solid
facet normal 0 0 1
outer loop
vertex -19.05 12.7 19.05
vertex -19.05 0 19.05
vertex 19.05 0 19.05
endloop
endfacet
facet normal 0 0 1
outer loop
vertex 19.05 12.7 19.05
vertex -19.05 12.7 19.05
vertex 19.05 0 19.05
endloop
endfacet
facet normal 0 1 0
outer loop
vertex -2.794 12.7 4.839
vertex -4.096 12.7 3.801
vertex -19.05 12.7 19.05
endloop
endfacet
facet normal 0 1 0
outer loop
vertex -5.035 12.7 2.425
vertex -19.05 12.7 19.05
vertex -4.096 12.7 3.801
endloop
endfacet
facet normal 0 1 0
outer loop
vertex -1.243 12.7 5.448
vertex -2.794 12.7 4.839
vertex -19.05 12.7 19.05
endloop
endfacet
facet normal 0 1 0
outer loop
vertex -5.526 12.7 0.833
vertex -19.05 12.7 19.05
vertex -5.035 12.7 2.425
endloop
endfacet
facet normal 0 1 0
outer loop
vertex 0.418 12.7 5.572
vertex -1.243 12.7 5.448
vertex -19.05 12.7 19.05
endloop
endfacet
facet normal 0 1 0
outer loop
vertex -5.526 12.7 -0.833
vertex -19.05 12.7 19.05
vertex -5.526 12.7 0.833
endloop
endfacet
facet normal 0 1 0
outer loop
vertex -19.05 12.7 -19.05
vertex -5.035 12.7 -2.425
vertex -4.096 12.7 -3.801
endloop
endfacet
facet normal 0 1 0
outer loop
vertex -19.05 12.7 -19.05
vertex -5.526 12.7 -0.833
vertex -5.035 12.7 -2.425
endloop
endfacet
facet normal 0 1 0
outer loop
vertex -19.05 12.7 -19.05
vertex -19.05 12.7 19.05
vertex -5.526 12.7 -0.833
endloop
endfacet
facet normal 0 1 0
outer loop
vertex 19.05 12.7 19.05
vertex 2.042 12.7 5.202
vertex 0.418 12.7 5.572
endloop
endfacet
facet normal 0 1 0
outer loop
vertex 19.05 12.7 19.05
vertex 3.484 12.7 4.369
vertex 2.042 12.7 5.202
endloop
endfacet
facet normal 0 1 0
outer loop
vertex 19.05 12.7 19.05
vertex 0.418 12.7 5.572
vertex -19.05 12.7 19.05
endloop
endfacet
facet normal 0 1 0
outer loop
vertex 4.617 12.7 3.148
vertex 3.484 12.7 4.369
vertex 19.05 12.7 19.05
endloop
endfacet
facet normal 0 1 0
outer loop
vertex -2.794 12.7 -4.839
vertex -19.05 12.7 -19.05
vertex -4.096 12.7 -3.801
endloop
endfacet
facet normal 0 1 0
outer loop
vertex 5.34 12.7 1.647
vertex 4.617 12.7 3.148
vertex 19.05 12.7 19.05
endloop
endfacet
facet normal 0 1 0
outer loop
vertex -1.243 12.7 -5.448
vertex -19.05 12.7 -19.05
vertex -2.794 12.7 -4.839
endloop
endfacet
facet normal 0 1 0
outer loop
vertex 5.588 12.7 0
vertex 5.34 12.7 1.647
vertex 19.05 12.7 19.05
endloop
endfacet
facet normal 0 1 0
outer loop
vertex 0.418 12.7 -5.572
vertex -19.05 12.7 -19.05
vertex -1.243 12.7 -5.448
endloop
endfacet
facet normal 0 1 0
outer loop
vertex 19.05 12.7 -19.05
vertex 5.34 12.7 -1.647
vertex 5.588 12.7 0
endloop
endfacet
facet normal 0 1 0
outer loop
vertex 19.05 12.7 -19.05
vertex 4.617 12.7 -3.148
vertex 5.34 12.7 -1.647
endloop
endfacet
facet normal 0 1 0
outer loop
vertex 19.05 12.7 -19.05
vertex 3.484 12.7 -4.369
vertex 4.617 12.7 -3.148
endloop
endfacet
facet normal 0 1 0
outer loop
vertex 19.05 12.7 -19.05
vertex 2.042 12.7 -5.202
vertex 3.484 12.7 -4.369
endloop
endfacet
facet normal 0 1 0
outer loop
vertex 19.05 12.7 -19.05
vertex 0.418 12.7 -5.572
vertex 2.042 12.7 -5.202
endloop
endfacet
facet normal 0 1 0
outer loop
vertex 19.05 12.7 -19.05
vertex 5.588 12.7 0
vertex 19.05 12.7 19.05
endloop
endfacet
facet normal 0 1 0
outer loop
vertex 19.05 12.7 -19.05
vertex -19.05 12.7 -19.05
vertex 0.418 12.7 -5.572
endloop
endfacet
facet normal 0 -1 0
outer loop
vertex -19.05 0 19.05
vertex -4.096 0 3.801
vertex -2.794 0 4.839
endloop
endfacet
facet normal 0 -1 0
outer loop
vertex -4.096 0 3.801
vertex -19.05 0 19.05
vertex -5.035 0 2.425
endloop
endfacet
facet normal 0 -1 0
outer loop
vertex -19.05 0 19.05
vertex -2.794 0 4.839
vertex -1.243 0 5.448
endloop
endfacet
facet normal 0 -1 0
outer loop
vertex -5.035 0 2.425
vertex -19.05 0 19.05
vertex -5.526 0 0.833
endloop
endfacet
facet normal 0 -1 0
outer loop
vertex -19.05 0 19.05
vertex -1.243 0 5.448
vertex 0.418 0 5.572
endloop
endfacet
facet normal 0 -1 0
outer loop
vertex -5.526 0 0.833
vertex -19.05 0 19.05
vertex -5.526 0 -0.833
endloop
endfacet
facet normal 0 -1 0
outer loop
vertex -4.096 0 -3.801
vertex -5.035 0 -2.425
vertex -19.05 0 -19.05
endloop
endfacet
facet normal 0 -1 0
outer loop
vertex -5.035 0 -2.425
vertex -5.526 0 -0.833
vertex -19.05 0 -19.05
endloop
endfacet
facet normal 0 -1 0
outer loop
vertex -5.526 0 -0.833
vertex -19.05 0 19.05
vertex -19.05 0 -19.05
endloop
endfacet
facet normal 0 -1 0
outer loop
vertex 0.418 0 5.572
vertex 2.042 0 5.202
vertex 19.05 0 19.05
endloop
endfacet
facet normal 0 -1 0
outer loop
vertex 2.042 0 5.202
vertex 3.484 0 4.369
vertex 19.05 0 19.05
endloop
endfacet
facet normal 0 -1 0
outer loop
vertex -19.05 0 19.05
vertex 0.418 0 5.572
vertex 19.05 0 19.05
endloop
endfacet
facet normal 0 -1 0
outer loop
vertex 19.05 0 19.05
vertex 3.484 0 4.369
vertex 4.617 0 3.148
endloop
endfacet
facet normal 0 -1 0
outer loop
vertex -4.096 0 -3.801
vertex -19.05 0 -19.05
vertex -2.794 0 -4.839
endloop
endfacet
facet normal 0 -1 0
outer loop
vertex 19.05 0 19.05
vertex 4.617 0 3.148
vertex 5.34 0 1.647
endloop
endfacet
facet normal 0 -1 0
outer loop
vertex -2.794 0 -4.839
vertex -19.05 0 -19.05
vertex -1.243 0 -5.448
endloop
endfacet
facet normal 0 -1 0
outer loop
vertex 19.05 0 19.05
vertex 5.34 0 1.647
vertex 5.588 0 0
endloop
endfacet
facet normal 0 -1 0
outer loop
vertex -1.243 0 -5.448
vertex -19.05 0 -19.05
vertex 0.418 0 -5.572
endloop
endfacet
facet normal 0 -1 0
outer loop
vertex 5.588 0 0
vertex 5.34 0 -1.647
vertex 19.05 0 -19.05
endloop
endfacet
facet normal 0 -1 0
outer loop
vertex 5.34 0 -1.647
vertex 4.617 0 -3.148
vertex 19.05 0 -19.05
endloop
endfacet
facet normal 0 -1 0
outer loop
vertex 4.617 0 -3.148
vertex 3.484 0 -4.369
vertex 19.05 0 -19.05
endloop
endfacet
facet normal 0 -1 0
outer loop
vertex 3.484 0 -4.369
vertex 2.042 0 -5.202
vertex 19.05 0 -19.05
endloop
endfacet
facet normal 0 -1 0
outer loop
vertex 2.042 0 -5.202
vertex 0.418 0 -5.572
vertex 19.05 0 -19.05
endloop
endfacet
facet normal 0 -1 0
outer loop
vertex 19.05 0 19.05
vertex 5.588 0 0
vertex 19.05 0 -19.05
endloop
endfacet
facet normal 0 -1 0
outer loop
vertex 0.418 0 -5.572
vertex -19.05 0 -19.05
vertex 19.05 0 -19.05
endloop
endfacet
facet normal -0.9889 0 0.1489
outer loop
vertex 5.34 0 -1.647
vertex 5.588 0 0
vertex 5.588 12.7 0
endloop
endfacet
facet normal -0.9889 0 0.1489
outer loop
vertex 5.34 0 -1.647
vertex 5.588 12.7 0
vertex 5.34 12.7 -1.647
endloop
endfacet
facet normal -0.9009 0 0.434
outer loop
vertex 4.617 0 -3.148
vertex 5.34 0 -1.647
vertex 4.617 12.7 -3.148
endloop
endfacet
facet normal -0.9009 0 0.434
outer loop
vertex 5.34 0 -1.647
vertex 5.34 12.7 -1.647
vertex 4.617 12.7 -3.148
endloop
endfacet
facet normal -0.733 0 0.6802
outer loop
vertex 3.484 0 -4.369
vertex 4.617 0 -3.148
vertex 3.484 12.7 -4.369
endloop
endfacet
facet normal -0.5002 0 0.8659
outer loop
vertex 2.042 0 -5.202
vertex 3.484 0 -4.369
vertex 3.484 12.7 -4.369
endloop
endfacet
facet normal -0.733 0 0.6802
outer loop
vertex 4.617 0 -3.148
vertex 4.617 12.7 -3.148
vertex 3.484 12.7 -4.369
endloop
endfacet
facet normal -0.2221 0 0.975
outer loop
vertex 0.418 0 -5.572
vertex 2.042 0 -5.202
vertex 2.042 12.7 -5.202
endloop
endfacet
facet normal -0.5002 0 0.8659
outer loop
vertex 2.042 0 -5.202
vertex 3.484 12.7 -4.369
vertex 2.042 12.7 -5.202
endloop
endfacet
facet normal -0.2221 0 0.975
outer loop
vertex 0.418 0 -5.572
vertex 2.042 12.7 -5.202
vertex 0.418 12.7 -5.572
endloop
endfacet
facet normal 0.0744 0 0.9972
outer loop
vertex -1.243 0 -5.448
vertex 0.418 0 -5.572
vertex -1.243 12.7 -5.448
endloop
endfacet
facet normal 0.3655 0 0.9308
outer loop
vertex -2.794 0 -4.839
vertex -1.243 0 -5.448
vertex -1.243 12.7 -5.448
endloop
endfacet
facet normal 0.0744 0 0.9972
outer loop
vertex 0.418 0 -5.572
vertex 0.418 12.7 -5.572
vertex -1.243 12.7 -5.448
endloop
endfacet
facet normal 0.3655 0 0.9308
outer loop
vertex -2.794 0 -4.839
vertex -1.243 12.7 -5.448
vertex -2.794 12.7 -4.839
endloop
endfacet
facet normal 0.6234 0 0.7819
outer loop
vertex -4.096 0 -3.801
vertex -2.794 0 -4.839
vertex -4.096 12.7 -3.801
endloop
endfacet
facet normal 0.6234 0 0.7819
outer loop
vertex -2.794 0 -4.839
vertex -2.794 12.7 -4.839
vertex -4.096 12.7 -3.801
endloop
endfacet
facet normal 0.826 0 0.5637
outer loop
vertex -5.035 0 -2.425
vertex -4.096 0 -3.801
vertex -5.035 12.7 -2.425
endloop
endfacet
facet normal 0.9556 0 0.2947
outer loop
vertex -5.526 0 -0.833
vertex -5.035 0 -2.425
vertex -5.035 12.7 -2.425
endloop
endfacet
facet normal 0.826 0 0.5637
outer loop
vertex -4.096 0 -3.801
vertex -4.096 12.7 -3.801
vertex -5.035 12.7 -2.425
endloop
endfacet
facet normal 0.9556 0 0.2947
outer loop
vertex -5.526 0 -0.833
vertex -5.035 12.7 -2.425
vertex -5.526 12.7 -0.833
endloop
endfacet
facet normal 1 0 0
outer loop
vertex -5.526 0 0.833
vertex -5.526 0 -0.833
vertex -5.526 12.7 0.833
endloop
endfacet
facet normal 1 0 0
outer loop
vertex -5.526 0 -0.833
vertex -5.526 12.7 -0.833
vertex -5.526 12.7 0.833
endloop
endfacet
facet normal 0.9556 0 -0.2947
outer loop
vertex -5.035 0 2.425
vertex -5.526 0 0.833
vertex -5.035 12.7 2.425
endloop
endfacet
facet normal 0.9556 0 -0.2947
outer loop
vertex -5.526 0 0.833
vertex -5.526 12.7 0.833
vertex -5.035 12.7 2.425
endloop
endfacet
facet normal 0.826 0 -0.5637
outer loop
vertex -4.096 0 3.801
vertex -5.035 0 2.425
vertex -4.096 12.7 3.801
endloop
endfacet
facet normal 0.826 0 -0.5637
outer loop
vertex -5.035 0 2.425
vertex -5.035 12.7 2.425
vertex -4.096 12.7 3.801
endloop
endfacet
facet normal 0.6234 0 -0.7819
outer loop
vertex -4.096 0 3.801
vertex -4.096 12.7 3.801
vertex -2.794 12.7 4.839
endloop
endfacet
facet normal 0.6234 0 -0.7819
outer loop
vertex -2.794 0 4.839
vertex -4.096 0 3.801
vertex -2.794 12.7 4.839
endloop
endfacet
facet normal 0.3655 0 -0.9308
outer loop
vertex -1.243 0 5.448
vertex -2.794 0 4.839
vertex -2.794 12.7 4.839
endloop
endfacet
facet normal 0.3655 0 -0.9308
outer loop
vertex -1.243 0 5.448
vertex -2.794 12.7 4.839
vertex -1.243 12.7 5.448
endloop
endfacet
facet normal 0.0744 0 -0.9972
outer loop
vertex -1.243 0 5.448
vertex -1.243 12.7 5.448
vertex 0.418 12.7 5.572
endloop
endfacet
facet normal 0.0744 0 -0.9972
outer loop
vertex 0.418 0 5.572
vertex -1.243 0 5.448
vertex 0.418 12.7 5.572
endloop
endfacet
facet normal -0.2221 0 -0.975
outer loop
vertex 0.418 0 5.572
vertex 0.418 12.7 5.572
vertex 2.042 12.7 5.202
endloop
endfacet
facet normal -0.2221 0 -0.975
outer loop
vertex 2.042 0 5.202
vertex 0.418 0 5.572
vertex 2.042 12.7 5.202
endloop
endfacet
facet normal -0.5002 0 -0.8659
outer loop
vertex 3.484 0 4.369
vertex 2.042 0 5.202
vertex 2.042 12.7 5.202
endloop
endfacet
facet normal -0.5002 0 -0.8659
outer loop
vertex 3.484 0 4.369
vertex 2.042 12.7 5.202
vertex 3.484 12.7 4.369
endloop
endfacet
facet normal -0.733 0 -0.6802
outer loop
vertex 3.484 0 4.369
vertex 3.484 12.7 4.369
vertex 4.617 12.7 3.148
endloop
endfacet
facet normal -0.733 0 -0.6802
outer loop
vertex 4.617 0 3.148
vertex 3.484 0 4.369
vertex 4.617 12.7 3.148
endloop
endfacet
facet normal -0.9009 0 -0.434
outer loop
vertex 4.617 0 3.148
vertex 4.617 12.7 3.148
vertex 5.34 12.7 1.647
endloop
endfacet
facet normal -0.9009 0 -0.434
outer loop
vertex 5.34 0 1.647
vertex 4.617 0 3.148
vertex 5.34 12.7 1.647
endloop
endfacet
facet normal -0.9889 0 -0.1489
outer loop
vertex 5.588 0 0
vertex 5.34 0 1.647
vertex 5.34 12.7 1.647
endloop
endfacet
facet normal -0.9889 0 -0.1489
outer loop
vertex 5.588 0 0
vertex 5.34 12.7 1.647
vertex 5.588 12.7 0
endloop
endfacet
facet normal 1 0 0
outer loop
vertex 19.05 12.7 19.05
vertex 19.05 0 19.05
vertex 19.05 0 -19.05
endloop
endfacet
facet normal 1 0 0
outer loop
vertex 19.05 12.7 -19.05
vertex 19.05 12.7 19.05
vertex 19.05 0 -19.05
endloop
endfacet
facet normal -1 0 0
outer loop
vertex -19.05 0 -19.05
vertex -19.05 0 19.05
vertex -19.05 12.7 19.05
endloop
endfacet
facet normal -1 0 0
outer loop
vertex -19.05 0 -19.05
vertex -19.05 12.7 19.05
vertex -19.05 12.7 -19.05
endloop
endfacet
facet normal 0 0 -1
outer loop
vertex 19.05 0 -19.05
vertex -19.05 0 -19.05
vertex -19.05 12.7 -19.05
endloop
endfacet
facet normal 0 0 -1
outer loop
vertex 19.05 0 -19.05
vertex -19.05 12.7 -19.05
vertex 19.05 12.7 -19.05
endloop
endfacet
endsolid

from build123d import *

# Parameters (mm, degrees)
SKETCH1_W           = 38.1
SKETCH1_H           = 38.1
BOSS_EXTRUDE1_DEPTH = 12.7
CUT_EXTRUDE1_REACH  = 14.7
SKETCH2_R           = 5.588


with BuildPart() as part:
    # Sketch1 → Boss-Extrude1 (new body)
    with BuildSketch(Plane(origin=(0, 0, 0), x_dir=(1, 0, 0), z_dir=(0, 1, 0))):
        Rectangle(SKETCH1_W, SKETCH1_H)
    extrude(amount=BOSS_EXTRUDE1_DEPTH)

    # Sketch2 → Cut-Extrude1 (cut, up to next)
    with BuildSketch(Plane(origin=(0, 12.7, 0), x_dir=(1, 0, 0), z_dir=(0, 1, 0)), mode=Mode.PRIVATE) as cut_extrude1_sk1:
        Circle(SKETCH2_R)
    cut_extrude1_tool1 = extrude(cut_extrude1_sk1.sketch, amount=-CUT_EXTRUDE1_REACH, mode=Mode.PRIVATE) & part.part
    add(cut_extrude1_tool1.solids().sort_by_distance((0, 12.7, 0))[0], mode=Mode.SUBTRACT)


solid = part.part
